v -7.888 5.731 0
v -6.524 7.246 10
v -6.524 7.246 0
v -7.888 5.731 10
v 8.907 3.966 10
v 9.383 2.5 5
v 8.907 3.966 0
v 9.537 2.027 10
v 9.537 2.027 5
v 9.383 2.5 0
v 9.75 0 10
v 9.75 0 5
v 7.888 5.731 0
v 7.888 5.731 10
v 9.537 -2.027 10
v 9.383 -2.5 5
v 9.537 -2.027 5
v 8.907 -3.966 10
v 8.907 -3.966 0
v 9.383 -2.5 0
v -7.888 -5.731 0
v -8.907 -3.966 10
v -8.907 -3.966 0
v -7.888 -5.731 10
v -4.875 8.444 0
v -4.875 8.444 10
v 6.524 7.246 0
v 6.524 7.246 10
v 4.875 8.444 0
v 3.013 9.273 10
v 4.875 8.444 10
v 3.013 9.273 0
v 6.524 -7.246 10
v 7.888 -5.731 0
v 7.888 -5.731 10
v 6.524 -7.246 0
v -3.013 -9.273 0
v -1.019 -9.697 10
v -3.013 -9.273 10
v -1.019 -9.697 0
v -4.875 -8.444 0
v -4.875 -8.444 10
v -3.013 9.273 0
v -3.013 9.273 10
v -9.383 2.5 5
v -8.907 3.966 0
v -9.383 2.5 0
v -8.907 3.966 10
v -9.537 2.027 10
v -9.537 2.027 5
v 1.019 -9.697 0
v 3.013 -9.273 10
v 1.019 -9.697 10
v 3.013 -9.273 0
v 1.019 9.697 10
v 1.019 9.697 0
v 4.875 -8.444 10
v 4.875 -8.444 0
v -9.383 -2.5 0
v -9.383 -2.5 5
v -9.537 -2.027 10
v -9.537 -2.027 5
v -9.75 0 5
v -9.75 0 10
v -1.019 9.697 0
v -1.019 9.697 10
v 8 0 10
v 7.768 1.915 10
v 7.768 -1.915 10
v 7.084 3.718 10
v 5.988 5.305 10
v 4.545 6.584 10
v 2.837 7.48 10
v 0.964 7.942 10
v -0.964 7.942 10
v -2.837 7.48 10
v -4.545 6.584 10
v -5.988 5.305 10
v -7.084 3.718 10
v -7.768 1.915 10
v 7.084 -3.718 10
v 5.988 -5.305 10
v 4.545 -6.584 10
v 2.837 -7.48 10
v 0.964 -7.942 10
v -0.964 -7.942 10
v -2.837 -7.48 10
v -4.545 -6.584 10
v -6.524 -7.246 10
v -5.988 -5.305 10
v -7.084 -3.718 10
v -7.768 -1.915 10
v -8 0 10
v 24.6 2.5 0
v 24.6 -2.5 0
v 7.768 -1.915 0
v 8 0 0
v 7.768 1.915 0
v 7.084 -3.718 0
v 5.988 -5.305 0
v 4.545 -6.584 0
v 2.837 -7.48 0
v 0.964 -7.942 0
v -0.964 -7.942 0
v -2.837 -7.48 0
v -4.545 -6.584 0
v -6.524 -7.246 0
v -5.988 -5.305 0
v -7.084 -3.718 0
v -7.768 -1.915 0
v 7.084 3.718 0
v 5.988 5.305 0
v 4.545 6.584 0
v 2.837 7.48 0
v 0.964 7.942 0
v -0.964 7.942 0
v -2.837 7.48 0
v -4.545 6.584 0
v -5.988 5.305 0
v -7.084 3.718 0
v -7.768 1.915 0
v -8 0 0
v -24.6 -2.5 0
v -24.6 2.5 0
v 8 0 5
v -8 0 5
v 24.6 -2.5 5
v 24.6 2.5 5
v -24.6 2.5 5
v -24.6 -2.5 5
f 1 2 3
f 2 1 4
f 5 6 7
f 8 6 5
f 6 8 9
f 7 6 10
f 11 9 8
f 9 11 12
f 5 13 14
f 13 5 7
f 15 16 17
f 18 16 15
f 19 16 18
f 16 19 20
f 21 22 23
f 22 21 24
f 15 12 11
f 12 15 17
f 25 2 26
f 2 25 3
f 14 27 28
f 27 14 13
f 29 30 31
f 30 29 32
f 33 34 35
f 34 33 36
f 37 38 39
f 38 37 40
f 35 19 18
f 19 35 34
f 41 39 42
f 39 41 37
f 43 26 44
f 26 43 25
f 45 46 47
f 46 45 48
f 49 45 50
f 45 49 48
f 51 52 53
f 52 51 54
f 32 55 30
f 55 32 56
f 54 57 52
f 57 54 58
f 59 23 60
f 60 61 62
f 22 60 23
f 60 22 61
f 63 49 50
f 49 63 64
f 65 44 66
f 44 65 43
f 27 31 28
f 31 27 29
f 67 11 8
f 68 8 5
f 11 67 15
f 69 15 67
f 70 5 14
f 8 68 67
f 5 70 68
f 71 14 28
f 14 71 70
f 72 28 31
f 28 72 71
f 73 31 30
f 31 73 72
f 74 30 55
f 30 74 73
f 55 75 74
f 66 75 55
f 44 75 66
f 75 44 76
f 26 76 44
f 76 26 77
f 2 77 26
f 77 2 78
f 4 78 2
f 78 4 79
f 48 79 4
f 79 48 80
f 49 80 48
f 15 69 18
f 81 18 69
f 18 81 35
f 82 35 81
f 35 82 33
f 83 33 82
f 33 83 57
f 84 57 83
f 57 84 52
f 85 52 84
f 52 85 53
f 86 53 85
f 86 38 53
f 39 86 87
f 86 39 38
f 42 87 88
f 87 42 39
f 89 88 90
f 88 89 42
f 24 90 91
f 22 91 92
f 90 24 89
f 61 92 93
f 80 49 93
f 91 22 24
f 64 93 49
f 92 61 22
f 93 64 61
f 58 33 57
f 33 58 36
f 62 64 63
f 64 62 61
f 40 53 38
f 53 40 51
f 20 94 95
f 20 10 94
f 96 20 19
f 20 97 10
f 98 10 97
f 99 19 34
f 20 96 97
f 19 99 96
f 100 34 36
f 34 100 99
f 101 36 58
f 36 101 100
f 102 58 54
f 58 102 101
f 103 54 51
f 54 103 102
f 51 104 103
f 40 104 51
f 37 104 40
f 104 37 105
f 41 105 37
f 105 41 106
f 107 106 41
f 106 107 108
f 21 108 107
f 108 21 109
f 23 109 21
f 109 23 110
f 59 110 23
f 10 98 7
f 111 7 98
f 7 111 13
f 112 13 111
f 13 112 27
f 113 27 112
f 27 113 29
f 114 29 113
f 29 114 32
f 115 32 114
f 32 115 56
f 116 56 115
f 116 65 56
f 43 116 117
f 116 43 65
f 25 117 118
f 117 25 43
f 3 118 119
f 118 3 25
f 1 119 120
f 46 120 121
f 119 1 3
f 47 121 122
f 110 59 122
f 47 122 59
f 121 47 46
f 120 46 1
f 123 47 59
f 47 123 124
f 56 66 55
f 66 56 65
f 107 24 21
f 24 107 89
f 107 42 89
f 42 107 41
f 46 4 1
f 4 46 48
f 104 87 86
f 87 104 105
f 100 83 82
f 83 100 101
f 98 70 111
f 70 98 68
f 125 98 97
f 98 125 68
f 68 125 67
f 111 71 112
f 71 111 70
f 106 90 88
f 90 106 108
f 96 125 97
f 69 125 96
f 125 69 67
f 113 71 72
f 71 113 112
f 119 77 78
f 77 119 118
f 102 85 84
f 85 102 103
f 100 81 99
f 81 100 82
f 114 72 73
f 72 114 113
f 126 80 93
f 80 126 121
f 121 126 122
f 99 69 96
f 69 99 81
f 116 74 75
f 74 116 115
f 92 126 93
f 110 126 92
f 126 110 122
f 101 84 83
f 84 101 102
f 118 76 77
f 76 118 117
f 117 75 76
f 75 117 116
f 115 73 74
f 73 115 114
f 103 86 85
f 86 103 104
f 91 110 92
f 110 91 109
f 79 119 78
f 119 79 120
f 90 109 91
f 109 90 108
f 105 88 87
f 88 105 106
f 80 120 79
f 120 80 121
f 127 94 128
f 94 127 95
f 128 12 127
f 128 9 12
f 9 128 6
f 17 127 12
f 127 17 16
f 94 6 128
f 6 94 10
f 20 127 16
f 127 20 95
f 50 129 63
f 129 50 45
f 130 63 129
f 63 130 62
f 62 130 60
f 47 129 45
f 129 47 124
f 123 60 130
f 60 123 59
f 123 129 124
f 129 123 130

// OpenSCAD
    // Inner ring (5mm to 10mm diameter)
    difference() {
        cylinder(h=10, d=19.5);
        cylinder(h=10, d=16);
    }

    
    // Connecting spokes
    for(i = [0:180:359]) {
        rotate([0,0,i]) {
            translate([8,-2.5,0]) {
                cube([16.6, 5, 5]);
            }
        }
    }
